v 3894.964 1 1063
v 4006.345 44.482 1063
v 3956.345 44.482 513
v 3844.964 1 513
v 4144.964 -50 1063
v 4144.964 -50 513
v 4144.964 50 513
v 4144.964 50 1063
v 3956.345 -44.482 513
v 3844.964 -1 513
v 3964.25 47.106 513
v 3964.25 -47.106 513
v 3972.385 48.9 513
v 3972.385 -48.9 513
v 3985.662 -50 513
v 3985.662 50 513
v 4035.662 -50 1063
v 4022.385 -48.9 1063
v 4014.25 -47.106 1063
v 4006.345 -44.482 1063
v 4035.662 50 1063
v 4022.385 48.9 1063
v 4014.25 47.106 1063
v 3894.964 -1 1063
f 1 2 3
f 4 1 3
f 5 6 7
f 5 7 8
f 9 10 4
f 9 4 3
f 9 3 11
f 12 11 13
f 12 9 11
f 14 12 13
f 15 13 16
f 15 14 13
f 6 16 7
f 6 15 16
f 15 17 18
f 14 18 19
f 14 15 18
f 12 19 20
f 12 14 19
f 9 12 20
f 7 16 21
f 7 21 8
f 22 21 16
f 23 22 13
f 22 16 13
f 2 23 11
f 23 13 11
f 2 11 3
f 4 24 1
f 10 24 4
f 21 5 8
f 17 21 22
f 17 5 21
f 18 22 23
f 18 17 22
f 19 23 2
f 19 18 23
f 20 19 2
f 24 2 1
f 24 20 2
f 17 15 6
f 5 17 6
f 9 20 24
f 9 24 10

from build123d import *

# Parameters (mm, degrees)
PAD002_DEPTH  = 50
CHAMFER_SIZE2 = 125
CHAMFER_SIZE  = 49
FILLET_R      = 80


with BuildPart() as part:
    # Sketch004 → Pad002 (new body, symmetric)
    with BuildSketch(Plane.XZ):
        Polygon((0, 0), (300, 0), (300, 550), (50, 550), align=None)
    extrude(amount=PAD002_DEPTH, both=True)

    # Chamfer
    chamfer_edges = [part.edges().sort_by_distance(p)[0] for p in [
        (25, 50, 275),
        (25, -50, 275),
    ]]
    chamfer_side = part.faces().sort_by_distance((25, 0, 275))[0]
    chamfer(chamfer_edges, length=CHAMFER_SIZE, length2=CHAMFER_SIZE2, reference=chamfer_side)


with BuildPart() as part_1:
    # Body005 placement: moved
    add(part.part.moved(Location((3844.9642, 0, 513))))

    # Fillet
    fillet_edges = [part_1.edges().sort_by_distance(p)[0] for p in [
        (3995.479666, 50, 788),
        (3995.479666, -50, 788),
    ]]
    fillet(fillet_edges, radius=FILLET_R)


solid = part_1.part
